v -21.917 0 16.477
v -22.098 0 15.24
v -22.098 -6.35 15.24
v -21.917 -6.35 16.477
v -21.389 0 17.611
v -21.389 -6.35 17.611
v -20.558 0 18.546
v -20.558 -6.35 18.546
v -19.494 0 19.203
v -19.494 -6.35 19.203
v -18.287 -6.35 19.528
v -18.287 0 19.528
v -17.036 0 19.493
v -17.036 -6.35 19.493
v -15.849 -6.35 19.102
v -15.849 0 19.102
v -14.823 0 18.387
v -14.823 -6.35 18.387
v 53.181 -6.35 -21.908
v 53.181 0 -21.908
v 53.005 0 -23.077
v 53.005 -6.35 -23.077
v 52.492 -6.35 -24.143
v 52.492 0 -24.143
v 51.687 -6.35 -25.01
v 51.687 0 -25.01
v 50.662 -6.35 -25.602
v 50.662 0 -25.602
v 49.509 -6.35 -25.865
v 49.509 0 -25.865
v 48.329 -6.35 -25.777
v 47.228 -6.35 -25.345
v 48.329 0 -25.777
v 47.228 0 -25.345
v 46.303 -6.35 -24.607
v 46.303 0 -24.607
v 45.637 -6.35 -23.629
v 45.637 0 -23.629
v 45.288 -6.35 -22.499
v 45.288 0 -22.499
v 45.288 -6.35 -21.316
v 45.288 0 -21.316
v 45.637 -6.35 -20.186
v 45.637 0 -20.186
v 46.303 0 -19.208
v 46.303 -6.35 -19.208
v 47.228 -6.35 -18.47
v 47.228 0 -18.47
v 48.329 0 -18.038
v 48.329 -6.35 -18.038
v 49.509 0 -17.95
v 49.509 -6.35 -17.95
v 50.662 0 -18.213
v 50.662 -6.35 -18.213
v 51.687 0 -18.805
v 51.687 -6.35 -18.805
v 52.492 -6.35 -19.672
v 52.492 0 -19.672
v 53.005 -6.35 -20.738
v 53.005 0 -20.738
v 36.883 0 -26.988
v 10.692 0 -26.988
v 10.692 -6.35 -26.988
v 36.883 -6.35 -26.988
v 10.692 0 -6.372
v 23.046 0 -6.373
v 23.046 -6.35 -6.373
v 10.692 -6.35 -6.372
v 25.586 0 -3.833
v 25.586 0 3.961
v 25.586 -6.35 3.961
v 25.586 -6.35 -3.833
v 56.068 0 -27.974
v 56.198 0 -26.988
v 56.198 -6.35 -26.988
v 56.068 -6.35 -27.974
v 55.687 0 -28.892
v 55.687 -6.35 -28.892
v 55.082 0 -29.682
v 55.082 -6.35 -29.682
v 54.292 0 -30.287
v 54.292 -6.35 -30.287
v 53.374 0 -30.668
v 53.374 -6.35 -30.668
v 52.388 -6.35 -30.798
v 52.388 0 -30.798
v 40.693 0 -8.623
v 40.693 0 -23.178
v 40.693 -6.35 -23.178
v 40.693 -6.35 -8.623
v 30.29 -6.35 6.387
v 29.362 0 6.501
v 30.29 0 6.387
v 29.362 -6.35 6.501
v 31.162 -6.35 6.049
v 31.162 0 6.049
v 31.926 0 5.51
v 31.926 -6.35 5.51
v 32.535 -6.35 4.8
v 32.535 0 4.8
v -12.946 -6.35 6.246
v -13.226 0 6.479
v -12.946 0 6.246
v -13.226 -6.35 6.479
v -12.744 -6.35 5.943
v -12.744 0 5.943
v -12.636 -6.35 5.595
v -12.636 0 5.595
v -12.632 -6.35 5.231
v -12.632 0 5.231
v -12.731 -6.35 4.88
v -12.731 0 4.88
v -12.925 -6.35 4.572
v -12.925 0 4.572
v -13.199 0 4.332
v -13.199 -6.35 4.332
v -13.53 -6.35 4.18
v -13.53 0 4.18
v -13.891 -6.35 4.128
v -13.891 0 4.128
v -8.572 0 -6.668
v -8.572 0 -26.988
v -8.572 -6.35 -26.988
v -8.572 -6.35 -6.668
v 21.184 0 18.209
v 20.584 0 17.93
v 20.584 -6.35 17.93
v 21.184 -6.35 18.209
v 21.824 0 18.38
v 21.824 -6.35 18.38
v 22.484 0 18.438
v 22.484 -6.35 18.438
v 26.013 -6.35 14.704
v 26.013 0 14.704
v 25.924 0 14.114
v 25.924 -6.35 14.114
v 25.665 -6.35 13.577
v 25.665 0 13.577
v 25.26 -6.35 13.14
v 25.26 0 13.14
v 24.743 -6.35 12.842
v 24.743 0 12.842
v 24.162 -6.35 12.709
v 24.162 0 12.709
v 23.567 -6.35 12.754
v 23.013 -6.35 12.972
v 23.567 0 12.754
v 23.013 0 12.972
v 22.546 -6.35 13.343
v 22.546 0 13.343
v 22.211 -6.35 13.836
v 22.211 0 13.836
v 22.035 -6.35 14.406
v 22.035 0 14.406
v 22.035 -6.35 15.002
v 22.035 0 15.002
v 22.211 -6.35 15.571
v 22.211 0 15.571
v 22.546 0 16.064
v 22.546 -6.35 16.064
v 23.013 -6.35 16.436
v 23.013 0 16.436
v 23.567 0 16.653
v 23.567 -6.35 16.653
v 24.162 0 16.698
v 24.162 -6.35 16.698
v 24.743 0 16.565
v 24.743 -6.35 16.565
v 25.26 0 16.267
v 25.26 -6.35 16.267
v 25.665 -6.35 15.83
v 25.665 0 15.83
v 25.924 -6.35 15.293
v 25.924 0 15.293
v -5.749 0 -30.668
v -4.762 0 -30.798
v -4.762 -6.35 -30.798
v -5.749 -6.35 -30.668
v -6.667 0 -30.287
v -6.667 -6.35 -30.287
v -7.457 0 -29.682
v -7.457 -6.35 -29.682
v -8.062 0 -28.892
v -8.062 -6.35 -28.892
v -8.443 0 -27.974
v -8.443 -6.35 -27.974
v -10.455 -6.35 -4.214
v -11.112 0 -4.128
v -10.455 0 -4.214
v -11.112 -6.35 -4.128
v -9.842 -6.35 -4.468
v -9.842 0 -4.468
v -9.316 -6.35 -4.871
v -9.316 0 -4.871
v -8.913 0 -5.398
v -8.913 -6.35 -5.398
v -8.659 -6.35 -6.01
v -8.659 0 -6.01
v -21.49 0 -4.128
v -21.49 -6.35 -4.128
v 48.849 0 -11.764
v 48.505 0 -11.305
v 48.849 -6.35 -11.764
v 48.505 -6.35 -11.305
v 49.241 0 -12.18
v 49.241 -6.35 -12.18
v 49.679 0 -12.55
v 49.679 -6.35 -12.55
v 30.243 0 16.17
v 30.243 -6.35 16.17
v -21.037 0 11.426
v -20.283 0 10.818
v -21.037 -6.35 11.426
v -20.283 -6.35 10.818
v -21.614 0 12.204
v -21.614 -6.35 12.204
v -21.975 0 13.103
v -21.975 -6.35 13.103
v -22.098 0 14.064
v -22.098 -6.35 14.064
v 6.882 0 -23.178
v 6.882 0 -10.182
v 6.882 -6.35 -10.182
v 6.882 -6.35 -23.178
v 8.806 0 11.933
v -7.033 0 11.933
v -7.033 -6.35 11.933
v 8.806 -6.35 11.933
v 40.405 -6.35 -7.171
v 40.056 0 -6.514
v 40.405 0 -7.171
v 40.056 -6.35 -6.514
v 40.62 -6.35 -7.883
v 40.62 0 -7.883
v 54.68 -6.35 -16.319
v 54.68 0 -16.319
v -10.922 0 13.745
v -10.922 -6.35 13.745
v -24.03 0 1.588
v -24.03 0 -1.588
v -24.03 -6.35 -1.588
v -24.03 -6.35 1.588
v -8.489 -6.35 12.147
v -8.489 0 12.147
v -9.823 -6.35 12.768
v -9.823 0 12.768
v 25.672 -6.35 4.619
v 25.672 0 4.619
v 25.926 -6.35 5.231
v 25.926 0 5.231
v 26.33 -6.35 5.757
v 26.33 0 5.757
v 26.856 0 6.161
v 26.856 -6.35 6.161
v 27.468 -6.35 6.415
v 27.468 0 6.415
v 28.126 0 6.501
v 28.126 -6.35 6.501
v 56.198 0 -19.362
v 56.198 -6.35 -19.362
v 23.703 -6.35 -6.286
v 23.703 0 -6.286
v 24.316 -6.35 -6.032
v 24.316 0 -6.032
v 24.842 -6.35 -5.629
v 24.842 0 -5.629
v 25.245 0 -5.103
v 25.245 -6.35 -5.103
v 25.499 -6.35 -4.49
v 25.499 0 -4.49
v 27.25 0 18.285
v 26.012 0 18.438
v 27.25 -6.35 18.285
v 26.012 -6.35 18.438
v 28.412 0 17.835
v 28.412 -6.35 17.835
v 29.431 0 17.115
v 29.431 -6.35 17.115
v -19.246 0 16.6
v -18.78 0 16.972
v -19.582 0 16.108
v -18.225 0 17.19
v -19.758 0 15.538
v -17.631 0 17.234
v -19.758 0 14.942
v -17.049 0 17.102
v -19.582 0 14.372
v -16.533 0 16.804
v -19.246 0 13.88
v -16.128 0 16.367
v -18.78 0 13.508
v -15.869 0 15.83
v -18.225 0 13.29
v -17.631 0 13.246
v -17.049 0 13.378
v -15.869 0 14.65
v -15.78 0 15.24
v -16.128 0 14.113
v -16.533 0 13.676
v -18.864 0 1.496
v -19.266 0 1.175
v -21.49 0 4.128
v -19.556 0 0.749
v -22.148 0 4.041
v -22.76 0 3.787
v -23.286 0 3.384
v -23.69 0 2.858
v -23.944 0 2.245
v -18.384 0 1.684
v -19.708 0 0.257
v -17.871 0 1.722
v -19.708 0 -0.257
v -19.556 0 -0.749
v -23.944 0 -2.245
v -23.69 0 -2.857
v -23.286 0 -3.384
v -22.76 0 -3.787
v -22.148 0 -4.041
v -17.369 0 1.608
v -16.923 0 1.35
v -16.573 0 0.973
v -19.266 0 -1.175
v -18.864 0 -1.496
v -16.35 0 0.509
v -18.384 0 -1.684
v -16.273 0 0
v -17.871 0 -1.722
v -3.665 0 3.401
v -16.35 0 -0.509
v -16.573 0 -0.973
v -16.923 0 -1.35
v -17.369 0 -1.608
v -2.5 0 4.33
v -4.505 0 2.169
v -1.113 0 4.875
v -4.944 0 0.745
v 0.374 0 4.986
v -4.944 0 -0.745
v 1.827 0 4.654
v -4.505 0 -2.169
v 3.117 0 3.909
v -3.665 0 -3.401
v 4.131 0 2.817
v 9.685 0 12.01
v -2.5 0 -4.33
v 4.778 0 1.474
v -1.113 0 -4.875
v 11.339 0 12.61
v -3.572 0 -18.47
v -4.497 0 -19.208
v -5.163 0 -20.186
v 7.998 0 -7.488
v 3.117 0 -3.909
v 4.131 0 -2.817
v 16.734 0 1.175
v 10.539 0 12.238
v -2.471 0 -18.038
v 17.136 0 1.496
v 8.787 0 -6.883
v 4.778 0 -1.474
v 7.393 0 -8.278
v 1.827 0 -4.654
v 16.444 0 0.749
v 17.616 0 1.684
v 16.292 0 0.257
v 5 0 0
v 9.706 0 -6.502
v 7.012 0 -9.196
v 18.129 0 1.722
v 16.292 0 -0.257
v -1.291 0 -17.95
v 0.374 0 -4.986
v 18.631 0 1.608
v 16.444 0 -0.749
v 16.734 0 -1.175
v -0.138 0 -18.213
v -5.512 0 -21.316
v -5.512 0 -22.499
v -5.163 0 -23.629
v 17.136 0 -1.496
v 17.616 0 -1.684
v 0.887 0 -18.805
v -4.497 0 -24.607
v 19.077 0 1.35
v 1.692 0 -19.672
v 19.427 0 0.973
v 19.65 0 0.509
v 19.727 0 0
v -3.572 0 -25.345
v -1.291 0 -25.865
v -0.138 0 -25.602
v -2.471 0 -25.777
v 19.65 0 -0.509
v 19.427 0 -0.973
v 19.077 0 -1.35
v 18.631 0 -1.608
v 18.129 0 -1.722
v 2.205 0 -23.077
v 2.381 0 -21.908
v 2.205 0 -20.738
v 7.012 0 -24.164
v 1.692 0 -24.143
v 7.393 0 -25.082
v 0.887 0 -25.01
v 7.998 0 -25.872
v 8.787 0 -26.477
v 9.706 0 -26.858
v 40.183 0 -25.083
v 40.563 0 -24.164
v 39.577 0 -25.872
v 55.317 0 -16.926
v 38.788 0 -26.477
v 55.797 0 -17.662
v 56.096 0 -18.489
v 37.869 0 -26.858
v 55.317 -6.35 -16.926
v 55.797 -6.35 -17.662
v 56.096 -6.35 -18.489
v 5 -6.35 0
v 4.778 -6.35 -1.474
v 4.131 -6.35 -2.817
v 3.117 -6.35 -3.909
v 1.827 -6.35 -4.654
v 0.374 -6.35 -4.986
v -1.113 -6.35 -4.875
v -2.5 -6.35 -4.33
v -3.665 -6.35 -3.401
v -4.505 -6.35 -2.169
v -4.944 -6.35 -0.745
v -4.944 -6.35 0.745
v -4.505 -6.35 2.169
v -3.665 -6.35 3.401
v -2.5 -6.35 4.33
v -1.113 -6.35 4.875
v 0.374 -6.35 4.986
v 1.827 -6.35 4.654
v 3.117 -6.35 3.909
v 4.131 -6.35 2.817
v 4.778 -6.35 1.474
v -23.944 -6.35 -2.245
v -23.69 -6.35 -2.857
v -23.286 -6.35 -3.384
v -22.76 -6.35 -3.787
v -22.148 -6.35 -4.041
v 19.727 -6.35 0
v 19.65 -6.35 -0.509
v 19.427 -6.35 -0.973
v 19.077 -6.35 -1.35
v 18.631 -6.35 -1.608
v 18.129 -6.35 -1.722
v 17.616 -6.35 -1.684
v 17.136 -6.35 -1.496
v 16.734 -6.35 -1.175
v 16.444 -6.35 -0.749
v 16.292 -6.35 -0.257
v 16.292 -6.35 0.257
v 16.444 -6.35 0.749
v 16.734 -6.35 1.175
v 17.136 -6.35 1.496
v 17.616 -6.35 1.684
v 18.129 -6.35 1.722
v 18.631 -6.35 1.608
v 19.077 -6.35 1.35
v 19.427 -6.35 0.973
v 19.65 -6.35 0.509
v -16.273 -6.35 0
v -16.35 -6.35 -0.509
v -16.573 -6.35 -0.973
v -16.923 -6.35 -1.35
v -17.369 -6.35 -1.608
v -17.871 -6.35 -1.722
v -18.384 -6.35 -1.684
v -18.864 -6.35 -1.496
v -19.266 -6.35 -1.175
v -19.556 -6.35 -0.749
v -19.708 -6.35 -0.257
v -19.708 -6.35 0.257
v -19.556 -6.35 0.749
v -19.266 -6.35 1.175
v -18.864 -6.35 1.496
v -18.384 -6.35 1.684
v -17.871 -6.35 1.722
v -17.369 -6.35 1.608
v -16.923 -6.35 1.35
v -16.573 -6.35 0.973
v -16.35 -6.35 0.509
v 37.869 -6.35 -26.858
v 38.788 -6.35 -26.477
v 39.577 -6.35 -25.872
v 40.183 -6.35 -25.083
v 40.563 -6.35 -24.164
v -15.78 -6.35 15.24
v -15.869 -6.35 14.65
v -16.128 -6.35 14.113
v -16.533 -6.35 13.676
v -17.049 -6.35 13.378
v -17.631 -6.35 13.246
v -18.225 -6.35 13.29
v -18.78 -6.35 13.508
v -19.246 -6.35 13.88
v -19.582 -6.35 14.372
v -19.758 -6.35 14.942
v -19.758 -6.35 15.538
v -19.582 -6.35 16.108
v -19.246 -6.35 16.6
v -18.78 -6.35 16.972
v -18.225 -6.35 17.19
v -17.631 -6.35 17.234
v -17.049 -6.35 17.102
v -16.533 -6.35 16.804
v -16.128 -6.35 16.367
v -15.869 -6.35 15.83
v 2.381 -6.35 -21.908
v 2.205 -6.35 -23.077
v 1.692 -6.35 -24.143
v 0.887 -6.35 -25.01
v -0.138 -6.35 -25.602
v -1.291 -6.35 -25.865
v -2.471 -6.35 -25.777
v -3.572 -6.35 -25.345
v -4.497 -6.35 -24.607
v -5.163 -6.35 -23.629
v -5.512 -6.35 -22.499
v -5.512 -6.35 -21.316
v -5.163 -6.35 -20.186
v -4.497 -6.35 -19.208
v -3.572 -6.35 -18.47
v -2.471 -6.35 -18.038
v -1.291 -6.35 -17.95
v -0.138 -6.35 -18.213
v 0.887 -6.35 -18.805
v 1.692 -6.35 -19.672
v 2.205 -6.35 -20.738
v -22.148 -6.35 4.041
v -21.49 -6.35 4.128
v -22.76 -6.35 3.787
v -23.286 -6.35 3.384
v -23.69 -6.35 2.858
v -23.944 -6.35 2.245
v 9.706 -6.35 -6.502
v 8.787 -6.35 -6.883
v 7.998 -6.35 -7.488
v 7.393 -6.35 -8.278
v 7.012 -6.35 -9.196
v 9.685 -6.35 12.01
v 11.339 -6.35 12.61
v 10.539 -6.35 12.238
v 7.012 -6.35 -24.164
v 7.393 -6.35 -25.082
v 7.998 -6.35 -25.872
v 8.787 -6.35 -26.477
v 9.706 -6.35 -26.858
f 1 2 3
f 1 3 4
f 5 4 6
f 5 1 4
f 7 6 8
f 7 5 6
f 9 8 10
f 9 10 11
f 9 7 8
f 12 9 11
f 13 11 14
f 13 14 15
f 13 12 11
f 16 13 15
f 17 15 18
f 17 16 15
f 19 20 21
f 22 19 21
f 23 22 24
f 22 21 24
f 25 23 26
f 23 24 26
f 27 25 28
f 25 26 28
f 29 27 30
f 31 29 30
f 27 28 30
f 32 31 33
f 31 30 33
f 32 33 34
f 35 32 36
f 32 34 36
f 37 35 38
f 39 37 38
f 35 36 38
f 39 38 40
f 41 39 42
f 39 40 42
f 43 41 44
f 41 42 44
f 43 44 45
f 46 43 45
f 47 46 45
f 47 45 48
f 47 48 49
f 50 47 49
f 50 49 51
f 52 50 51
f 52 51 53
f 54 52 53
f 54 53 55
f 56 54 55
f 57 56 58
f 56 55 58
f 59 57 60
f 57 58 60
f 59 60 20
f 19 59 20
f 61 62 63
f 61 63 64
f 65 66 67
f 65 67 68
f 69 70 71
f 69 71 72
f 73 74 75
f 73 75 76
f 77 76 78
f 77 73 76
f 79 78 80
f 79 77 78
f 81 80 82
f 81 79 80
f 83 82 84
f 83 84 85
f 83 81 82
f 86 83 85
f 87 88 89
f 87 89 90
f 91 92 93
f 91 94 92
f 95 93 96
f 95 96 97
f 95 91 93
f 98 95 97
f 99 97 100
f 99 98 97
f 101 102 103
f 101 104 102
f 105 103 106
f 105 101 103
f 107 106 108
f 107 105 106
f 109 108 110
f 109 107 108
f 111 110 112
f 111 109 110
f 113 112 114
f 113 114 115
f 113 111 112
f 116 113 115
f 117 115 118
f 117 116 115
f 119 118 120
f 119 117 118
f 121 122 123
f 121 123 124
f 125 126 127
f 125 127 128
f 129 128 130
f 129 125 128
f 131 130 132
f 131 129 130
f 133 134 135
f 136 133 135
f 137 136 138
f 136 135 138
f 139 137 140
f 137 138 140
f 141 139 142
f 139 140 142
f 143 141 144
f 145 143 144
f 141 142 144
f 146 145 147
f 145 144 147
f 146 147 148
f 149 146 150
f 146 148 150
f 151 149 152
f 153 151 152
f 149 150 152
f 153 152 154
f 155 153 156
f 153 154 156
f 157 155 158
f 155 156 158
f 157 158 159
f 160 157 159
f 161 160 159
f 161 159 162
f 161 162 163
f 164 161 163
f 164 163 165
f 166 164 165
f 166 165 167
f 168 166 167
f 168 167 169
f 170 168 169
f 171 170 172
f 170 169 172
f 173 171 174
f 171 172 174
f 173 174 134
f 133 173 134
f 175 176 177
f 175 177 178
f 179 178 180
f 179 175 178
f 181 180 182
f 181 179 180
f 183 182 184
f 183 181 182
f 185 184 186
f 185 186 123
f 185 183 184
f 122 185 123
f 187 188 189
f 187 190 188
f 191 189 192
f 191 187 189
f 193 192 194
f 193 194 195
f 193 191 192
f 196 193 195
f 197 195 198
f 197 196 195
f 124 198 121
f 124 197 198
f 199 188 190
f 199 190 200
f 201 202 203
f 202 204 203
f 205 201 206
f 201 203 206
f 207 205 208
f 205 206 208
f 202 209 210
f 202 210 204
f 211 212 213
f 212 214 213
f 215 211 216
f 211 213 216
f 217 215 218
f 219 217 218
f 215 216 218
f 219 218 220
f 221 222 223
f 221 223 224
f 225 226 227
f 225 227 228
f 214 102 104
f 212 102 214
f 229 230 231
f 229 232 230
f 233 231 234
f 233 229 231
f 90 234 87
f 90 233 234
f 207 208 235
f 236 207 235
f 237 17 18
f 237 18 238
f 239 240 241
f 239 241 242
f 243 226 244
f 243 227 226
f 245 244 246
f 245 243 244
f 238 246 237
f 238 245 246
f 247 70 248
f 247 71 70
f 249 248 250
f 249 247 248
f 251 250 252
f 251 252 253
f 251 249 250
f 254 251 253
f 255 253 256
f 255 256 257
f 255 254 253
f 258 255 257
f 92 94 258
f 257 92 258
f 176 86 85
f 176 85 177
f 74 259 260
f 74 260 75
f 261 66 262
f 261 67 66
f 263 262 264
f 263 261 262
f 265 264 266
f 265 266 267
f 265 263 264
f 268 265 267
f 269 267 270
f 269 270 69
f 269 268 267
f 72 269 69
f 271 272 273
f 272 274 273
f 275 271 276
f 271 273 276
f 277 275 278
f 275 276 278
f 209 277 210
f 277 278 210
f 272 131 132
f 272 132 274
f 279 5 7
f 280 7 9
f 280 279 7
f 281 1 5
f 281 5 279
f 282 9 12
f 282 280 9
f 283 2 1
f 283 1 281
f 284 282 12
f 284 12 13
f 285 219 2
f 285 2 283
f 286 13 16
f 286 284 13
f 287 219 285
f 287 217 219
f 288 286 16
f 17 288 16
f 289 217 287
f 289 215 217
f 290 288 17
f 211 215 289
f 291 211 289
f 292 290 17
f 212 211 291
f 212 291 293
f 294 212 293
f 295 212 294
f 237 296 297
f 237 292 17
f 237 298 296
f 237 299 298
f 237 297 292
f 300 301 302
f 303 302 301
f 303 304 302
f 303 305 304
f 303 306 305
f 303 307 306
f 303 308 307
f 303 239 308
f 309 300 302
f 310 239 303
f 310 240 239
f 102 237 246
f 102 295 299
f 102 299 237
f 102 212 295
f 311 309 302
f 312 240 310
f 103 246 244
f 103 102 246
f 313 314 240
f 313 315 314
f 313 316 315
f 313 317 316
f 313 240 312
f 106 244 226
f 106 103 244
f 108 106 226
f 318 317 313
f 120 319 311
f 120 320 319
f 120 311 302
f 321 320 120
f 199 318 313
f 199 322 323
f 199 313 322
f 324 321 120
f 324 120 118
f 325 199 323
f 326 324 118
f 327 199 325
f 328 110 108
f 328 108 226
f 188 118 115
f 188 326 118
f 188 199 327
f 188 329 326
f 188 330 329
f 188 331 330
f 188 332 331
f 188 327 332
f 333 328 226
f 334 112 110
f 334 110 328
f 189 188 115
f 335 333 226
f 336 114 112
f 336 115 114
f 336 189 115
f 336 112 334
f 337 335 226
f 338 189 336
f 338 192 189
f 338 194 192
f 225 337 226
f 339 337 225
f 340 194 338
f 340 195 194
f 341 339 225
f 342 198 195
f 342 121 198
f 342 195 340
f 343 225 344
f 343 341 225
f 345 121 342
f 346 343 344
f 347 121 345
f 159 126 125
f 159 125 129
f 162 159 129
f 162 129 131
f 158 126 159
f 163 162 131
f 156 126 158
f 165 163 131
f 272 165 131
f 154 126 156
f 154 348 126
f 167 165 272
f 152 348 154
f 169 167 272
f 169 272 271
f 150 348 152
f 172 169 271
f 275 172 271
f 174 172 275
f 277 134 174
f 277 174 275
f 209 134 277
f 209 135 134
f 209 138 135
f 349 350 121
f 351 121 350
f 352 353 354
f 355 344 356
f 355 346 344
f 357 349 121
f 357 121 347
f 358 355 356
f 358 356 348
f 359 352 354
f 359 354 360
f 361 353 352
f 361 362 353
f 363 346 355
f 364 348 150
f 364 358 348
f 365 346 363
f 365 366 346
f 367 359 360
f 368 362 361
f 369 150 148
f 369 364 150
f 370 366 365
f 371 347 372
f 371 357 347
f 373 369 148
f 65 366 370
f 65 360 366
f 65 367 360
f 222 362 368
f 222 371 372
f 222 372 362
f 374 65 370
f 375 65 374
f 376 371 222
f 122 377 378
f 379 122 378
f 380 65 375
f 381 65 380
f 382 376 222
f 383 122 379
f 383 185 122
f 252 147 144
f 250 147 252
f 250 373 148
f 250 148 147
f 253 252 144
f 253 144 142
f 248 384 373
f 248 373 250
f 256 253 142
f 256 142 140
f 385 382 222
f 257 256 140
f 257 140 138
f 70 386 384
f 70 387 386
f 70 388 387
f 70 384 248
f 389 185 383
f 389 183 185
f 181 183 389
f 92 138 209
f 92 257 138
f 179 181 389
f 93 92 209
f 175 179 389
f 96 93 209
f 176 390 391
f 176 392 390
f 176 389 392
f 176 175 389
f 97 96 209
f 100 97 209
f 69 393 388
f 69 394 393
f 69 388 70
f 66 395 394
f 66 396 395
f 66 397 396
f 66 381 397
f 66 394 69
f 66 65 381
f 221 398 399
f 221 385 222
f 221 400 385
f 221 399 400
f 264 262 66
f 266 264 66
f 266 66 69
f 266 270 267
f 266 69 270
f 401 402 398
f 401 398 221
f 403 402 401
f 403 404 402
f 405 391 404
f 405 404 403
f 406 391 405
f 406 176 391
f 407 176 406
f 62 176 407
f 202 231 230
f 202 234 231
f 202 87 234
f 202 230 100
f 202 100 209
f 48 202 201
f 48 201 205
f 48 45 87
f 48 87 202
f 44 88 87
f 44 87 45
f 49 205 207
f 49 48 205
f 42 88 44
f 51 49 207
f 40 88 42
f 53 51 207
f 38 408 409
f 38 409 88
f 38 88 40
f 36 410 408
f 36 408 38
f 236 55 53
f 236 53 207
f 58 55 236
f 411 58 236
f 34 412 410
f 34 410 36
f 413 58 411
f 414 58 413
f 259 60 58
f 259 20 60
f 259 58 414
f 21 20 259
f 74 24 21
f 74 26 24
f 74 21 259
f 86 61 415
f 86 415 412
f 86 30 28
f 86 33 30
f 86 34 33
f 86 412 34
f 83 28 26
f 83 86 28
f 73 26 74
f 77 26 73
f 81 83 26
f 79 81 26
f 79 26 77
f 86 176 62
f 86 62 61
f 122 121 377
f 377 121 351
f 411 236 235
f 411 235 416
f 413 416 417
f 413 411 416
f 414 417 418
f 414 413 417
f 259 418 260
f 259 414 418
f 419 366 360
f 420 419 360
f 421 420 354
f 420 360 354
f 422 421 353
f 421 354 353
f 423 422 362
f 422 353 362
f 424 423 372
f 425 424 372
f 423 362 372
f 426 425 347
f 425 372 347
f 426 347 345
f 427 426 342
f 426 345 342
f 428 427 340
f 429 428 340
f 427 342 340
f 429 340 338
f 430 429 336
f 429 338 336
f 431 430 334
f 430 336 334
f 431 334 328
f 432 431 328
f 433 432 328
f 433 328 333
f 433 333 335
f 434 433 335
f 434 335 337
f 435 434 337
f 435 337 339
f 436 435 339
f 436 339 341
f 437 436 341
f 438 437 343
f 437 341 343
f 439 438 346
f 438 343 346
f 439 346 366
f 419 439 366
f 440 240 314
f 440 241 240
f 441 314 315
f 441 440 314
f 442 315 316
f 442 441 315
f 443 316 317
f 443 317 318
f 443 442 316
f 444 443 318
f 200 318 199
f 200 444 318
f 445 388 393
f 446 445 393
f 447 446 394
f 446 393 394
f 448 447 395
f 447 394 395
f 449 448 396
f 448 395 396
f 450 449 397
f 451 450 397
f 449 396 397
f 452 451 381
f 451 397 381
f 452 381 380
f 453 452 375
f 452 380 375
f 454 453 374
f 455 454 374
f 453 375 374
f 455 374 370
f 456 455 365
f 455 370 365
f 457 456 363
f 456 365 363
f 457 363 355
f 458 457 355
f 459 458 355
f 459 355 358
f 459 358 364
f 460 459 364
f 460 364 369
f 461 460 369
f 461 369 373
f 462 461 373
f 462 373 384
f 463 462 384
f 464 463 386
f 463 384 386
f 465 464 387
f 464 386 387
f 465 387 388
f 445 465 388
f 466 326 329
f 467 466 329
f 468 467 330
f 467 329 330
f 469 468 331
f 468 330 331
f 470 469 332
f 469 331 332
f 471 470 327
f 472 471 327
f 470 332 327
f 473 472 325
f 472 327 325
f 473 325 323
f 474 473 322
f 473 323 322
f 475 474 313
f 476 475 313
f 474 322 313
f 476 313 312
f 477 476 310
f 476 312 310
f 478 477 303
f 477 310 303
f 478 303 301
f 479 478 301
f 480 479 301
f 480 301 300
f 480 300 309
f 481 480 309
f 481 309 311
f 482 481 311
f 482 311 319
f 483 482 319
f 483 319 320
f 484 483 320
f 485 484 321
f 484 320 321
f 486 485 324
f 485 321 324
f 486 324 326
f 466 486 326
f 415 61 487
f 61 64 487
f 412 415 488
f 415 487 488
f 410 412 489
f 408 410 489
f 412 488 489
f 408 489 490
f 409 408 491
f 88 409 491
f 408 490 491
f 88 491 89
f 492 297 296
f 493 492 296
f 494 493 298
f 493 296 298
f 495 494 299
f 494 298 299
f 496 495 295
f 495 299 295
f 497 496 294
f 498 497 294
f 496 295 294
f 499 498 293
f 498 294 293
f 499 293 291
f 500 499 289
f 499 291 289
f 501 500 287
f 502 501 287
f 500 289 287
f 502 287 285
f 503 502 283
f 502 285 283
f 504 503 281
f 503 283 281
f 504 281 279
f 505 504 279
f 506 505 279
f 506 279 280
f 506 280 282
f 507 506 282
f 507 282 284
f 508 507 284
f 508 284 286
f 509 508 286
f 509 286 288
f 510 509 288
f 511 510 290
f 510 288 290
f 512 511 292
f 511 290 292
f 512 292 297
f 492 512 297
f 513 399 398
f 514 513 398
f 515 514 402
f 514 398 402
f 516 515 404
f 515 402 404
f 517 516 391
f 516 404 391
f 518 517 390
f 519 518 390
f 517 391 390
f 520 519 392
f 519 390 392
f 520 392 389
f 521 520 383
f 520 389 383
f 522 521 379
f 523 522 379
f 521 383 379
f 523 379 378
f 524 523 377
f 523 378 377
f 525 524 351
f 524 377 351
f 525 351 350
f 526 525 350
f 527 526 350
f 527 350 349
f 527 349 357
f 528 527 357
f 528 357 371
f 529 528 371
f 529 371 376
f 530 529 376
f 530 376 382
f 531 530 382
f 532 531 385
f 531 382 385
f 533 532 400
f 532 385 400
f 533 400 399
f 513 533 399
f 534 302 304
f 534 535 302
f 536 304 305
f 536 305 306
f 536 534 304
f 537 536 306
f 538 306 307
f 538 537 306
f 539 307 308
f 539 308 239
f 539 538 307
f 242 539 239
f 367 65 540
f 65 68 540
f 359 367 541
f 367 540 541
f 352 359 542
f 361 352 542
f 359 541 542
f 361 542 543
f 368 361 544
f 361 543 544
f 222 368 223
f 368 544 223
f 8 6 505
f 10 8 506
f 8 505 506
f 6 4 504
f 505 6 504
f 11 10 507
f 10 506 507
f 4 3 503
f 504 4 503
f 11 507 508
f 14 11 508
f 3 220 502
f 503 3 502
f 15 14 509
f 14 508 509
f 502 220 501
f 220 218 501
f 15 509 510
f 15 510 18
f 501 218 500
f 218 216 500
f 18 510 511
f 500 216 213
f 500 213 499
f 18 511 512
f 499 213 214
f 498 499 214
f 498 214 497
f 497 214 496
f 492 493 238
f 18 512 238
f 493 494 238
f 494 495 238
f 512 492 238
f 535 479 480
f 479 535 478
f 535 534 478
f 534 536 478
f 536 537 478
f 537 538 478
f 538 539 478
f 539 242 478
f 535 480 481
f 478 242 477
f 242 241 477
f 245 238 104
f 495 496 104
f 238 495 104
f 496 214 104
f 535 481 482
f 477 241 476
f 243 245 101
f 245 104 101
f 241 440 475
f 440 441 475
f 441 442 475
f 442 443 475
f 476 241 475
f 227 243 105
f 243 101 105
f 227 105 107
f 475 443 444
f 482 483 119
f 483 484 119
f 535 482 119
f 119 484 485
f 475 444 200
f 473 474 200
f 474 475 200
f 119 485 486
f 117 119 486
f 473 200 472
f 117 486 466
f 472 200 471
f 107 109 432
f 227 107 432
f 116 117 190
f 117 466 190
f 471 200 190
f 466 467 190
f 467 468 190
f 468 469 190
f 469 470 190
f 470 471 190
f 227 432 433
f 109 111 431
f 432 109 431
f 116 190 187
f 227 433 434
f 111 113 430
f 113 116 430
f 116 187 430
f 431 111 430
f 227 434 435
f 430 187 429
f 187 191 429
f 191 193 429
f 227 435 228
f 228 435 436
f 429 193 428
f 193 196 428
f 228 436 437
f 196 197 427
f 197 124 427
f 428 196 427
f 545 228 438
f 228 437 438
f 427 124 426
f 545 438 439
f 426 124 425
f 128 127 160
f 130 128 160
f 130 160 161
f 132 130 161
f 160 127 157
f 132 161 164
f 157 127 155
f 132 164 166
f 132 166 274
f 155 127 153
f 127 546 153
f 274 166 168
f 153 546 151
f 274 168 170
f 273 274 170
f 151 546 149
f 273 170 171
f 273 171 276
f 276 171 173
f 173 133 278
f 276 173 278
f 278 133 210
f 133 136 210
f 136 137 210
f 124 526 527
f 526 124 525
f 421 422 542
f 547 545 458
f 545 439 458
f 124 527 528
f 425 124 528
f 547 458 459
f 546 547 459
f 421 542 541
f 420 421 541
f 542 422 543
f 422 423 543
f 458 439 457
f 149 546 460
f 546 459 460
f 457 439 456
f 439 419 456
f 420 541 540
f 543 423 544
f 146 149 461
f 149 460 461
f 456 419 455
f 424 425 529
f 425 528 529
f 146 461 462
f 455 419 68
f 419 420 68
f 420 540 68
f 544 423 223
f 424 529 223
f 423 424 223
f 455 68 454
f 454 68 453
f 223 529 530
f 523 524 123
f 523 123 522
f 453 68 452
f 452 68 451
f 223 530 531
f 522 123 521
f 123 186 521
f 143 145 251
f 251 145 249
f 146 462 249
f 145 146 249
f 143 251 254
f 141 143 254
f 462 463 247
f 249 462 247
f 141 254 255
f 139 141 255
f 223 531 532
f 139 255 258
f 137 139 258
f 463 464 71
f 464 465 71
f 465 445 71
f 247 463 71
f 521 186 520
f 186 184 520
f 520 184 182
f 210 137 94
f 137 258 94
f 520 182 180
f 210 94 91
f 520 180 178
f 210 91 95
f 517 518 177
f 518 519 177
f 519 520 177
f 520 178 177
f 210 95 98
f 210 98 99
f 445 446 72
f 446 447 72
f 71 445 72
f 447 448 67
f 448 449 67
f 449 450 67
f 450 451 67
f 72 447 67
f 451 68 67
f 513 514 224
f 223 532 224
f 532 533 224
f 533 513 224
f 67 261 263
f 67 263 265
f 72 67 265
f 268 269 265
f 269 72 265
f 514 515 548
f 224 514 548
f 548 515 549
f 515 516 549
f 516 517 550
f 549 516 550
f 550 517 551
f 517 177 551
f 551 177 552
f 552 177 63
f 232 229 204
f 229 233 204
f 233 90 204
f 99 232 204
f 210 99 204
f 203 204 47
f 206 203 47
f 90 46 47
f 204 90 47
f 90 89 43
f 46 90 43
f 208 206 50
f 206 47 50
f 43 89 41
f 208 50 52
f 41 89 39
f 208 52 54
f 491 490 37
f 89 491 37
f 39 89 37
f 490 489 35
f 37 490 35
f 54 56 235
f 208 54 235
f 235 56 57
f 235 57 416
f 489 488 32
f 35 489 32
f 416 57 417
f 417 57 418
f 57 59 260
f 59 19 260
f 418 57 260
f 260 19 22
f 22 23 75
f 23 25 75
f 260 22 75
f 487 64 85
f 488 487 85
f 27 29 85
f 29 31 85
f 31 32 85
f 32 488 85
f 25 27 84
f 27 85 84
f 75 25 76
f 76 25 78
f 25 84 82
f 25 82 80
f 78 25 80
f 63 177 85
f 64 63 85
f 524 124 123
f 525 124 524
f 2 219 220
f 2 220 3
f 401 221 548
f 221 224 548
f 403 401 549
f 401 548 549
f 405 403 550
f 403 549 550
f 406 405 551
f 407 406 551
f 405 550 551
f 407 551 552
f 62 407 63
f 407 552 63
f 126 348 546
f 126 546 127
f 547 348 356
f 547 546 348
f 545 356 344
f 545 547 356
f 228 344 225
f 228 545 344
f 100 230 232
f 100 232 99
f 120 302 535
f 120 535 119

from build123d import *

# Parameters (mm, degrees)
SKETCH4_R           = 2
SKETCH4_R_2         = 1.7272
SKETCH4_R_3         = 5
SKETCH4_R_4         = 3.96875
BOSS_EXTRUDE2_DEPTH = 6.35
FILLET1_R           = 5.08
FILLET7_R           = 3.81
FILLET9_R           = 5.08
FILLET10_R          = 1.27
FILLET11_R          = 3.81
FILLET12_R          = 2.54
FILLET13_R          = 3.81


with BuildPart() as part:
    # Sketch4 → Boss-Extrude2 (new body)
    with BuildSketch(Plane(origin=(0, 0, 0), x_dir=(1, 0, 0), z_dir=(0, 1, 0))):
        with BuildLine():
            Line((22.483900583, -18.4375), (28.735494078, -18.4375))
            Line((28.735494078, -18.4375), (48.985566477, 12.027918285))
            Line((48.985566477, 12.027918285), (54.680415238, 16.319294633))
            ThreePointArc((54.680415238, 16.319294633), (55.797199918, 17.662082259), (56.1975, 19.362095927))
            Line((56.1975, 19.362095927), (56.1975, 26.9875))
            ThreePointArc((56.1975, 26.9875), (55.081576836, 29.681576836), (52.3875, 30.7975))
            Line((52.3875, 30.7975), (-4.7625, 30.7975))
            ThreePointArc((-4.7625, 30.7975), (-7.456576836, 29.681576836), (-8.5725, 26.9875))
            Line((-8.5725, 26.9875), (-8.5725, 12.607500122))
            Line((-8.5725, 12.607500122), (-8.5725, 4.1275))
            Line((-8.5725, 4.1275), (-24.03032317, 4.1275))
            Line((-24.03032317, 4.1275), (-24.03032317, -4.1275))
            Line((-24.03032317, -4.1275), (-9.399713355, -4.1275))
            Line((-9.399713355, -4.1275), (-22.098, -11.933490986))
            Line((-22.098, -11.933490986), (-22.098, -15.24))
            ThreePointArc((-22.098, -15.24), (-19.494143335, -19.203185162), (-14.822948297, -18.386580561))
            Line((-14.822948297, -18.386580561), (-9.399713355, -11.933490986))
            Line((-9.399713355, -11.933490986), (10.16293305, -11.933490986))
            Line((10.16293305, -11.933490986), (20.583679925, -17.929811531))
            ThreePointArc((20.583679925, -17.929811531), (21.500464498, -18.308390309), (22.483900583, -18.4375))
        make_face()
        with Locations((-17.78, -15.24)):
            Circle(SKETCH4_R, mode=Mode.SUBTRACT)
        with Locations((-18.000000004, 0)):
            Circle(SKETCH4_R_2, mode=Mode.SUBTRACT)
        Circle(SKETCH4_R_3, mode=Mode.SUBTRACT)
        with Locations((24.012521227, -14.703599027)):
            Circle(SKETCH4_R, mode=Mode.SUBTRACT)
        with Locations((18.000000004, 0)):
            Circle(SKETCH4_R_2, mode=Mode.SUBTRACT)
        with Locations((-1.5875, 21.9075)):
            Circle(SKETCH4_R_4, mode=Mode.SUBTRACT)
        Polygon((6.882386285, 6.3725), (6.882386285, 26.9875), (40.692955064, 26.9875), (40.692955064, 7.472580753), (31.404651622, -6.501297657), (25.585775375, -6.501297657), (25.585775375, 6.3725), align=None, mode=Mode.SUBTRACT)
        with Locations((49.2125, 21.9075)):
            Circle(SKETCH4_R_4, mode=Mode.SUBTRACT)
    extrude(amount=-BOSS_EXTRUDE2_DEPTH)

    # Fillet1
    fillet1_edges = [part.edges().sort_by_distance(p)[0] for p in [
        (48.985566477, -3.175, -12.027918285),
        (28.735494078, -3.175, 18.4375),
    ]]
    fillet(fillet1_edges, radius=FILLET1_R)

    # Fillet7
    fillet7_edges = [part.edges().sort_by_distance(p)[0] for p in [
        (40.692955064, -3.175, -7.472580753),
        (40.692955064, -3.175, -26.9875),
        (6.882386285, -3.175, -26.9875),
        (6.882386285, -3.175, -6.3725),
    ]]
    fillet(fillet7_edges, radius=FILLET7_R)

    # Fillet9
    fillet9_edges = [part.edges().sort_by_distance(p)[0] for p in [
        (10.16293305, -3.175, 11.933490986),
        (-9.399713355, -3.175, 11.933490986),
    ]]
    fillet(fillet9_edges, radius=FILLET9_R)

    # Fillet10
    fillet10_edges = [part.edges().sort_by_distance(p)[0] for p in [
        (-9.399713355, -3.175, 4.1275),
    ]]
    fillet(fillet10_edges, radius=FILLET10_R)

    # Fillet11
    fillet11_edges = [part.edges().sort_by_distance(p)[0] for p in [
        (-22.098, -3.175, 11.933490986),
    ]]
    fillet(fillet11_edges, radius=FILLET11_R)

    # Fillet12
    fillet12_edges = [part.edges().sort_by_distance(p)[0] for p in [
        (25.585775375, -3.175, -6.3725),
        (25.585775375, -3.175, 6.501297657),
        (-24.03032317, -3.175, 4.1275),
        (-24.03032317, -3.175, -4.1275),
        (-8.5725, -3.175, -4.1275),
    ]]
    fillet(fillet12_edges, radius=FILLET12_R)

    # Fillet13
    fillet13_edges = [part.edges().sort_by_distance(p)[0] for p in [
        (31.404651622, -3.175, 6.501297657),
    ]]
    fillet(fillet13_edges, radius=FILLET13_R)


solid = part.part
